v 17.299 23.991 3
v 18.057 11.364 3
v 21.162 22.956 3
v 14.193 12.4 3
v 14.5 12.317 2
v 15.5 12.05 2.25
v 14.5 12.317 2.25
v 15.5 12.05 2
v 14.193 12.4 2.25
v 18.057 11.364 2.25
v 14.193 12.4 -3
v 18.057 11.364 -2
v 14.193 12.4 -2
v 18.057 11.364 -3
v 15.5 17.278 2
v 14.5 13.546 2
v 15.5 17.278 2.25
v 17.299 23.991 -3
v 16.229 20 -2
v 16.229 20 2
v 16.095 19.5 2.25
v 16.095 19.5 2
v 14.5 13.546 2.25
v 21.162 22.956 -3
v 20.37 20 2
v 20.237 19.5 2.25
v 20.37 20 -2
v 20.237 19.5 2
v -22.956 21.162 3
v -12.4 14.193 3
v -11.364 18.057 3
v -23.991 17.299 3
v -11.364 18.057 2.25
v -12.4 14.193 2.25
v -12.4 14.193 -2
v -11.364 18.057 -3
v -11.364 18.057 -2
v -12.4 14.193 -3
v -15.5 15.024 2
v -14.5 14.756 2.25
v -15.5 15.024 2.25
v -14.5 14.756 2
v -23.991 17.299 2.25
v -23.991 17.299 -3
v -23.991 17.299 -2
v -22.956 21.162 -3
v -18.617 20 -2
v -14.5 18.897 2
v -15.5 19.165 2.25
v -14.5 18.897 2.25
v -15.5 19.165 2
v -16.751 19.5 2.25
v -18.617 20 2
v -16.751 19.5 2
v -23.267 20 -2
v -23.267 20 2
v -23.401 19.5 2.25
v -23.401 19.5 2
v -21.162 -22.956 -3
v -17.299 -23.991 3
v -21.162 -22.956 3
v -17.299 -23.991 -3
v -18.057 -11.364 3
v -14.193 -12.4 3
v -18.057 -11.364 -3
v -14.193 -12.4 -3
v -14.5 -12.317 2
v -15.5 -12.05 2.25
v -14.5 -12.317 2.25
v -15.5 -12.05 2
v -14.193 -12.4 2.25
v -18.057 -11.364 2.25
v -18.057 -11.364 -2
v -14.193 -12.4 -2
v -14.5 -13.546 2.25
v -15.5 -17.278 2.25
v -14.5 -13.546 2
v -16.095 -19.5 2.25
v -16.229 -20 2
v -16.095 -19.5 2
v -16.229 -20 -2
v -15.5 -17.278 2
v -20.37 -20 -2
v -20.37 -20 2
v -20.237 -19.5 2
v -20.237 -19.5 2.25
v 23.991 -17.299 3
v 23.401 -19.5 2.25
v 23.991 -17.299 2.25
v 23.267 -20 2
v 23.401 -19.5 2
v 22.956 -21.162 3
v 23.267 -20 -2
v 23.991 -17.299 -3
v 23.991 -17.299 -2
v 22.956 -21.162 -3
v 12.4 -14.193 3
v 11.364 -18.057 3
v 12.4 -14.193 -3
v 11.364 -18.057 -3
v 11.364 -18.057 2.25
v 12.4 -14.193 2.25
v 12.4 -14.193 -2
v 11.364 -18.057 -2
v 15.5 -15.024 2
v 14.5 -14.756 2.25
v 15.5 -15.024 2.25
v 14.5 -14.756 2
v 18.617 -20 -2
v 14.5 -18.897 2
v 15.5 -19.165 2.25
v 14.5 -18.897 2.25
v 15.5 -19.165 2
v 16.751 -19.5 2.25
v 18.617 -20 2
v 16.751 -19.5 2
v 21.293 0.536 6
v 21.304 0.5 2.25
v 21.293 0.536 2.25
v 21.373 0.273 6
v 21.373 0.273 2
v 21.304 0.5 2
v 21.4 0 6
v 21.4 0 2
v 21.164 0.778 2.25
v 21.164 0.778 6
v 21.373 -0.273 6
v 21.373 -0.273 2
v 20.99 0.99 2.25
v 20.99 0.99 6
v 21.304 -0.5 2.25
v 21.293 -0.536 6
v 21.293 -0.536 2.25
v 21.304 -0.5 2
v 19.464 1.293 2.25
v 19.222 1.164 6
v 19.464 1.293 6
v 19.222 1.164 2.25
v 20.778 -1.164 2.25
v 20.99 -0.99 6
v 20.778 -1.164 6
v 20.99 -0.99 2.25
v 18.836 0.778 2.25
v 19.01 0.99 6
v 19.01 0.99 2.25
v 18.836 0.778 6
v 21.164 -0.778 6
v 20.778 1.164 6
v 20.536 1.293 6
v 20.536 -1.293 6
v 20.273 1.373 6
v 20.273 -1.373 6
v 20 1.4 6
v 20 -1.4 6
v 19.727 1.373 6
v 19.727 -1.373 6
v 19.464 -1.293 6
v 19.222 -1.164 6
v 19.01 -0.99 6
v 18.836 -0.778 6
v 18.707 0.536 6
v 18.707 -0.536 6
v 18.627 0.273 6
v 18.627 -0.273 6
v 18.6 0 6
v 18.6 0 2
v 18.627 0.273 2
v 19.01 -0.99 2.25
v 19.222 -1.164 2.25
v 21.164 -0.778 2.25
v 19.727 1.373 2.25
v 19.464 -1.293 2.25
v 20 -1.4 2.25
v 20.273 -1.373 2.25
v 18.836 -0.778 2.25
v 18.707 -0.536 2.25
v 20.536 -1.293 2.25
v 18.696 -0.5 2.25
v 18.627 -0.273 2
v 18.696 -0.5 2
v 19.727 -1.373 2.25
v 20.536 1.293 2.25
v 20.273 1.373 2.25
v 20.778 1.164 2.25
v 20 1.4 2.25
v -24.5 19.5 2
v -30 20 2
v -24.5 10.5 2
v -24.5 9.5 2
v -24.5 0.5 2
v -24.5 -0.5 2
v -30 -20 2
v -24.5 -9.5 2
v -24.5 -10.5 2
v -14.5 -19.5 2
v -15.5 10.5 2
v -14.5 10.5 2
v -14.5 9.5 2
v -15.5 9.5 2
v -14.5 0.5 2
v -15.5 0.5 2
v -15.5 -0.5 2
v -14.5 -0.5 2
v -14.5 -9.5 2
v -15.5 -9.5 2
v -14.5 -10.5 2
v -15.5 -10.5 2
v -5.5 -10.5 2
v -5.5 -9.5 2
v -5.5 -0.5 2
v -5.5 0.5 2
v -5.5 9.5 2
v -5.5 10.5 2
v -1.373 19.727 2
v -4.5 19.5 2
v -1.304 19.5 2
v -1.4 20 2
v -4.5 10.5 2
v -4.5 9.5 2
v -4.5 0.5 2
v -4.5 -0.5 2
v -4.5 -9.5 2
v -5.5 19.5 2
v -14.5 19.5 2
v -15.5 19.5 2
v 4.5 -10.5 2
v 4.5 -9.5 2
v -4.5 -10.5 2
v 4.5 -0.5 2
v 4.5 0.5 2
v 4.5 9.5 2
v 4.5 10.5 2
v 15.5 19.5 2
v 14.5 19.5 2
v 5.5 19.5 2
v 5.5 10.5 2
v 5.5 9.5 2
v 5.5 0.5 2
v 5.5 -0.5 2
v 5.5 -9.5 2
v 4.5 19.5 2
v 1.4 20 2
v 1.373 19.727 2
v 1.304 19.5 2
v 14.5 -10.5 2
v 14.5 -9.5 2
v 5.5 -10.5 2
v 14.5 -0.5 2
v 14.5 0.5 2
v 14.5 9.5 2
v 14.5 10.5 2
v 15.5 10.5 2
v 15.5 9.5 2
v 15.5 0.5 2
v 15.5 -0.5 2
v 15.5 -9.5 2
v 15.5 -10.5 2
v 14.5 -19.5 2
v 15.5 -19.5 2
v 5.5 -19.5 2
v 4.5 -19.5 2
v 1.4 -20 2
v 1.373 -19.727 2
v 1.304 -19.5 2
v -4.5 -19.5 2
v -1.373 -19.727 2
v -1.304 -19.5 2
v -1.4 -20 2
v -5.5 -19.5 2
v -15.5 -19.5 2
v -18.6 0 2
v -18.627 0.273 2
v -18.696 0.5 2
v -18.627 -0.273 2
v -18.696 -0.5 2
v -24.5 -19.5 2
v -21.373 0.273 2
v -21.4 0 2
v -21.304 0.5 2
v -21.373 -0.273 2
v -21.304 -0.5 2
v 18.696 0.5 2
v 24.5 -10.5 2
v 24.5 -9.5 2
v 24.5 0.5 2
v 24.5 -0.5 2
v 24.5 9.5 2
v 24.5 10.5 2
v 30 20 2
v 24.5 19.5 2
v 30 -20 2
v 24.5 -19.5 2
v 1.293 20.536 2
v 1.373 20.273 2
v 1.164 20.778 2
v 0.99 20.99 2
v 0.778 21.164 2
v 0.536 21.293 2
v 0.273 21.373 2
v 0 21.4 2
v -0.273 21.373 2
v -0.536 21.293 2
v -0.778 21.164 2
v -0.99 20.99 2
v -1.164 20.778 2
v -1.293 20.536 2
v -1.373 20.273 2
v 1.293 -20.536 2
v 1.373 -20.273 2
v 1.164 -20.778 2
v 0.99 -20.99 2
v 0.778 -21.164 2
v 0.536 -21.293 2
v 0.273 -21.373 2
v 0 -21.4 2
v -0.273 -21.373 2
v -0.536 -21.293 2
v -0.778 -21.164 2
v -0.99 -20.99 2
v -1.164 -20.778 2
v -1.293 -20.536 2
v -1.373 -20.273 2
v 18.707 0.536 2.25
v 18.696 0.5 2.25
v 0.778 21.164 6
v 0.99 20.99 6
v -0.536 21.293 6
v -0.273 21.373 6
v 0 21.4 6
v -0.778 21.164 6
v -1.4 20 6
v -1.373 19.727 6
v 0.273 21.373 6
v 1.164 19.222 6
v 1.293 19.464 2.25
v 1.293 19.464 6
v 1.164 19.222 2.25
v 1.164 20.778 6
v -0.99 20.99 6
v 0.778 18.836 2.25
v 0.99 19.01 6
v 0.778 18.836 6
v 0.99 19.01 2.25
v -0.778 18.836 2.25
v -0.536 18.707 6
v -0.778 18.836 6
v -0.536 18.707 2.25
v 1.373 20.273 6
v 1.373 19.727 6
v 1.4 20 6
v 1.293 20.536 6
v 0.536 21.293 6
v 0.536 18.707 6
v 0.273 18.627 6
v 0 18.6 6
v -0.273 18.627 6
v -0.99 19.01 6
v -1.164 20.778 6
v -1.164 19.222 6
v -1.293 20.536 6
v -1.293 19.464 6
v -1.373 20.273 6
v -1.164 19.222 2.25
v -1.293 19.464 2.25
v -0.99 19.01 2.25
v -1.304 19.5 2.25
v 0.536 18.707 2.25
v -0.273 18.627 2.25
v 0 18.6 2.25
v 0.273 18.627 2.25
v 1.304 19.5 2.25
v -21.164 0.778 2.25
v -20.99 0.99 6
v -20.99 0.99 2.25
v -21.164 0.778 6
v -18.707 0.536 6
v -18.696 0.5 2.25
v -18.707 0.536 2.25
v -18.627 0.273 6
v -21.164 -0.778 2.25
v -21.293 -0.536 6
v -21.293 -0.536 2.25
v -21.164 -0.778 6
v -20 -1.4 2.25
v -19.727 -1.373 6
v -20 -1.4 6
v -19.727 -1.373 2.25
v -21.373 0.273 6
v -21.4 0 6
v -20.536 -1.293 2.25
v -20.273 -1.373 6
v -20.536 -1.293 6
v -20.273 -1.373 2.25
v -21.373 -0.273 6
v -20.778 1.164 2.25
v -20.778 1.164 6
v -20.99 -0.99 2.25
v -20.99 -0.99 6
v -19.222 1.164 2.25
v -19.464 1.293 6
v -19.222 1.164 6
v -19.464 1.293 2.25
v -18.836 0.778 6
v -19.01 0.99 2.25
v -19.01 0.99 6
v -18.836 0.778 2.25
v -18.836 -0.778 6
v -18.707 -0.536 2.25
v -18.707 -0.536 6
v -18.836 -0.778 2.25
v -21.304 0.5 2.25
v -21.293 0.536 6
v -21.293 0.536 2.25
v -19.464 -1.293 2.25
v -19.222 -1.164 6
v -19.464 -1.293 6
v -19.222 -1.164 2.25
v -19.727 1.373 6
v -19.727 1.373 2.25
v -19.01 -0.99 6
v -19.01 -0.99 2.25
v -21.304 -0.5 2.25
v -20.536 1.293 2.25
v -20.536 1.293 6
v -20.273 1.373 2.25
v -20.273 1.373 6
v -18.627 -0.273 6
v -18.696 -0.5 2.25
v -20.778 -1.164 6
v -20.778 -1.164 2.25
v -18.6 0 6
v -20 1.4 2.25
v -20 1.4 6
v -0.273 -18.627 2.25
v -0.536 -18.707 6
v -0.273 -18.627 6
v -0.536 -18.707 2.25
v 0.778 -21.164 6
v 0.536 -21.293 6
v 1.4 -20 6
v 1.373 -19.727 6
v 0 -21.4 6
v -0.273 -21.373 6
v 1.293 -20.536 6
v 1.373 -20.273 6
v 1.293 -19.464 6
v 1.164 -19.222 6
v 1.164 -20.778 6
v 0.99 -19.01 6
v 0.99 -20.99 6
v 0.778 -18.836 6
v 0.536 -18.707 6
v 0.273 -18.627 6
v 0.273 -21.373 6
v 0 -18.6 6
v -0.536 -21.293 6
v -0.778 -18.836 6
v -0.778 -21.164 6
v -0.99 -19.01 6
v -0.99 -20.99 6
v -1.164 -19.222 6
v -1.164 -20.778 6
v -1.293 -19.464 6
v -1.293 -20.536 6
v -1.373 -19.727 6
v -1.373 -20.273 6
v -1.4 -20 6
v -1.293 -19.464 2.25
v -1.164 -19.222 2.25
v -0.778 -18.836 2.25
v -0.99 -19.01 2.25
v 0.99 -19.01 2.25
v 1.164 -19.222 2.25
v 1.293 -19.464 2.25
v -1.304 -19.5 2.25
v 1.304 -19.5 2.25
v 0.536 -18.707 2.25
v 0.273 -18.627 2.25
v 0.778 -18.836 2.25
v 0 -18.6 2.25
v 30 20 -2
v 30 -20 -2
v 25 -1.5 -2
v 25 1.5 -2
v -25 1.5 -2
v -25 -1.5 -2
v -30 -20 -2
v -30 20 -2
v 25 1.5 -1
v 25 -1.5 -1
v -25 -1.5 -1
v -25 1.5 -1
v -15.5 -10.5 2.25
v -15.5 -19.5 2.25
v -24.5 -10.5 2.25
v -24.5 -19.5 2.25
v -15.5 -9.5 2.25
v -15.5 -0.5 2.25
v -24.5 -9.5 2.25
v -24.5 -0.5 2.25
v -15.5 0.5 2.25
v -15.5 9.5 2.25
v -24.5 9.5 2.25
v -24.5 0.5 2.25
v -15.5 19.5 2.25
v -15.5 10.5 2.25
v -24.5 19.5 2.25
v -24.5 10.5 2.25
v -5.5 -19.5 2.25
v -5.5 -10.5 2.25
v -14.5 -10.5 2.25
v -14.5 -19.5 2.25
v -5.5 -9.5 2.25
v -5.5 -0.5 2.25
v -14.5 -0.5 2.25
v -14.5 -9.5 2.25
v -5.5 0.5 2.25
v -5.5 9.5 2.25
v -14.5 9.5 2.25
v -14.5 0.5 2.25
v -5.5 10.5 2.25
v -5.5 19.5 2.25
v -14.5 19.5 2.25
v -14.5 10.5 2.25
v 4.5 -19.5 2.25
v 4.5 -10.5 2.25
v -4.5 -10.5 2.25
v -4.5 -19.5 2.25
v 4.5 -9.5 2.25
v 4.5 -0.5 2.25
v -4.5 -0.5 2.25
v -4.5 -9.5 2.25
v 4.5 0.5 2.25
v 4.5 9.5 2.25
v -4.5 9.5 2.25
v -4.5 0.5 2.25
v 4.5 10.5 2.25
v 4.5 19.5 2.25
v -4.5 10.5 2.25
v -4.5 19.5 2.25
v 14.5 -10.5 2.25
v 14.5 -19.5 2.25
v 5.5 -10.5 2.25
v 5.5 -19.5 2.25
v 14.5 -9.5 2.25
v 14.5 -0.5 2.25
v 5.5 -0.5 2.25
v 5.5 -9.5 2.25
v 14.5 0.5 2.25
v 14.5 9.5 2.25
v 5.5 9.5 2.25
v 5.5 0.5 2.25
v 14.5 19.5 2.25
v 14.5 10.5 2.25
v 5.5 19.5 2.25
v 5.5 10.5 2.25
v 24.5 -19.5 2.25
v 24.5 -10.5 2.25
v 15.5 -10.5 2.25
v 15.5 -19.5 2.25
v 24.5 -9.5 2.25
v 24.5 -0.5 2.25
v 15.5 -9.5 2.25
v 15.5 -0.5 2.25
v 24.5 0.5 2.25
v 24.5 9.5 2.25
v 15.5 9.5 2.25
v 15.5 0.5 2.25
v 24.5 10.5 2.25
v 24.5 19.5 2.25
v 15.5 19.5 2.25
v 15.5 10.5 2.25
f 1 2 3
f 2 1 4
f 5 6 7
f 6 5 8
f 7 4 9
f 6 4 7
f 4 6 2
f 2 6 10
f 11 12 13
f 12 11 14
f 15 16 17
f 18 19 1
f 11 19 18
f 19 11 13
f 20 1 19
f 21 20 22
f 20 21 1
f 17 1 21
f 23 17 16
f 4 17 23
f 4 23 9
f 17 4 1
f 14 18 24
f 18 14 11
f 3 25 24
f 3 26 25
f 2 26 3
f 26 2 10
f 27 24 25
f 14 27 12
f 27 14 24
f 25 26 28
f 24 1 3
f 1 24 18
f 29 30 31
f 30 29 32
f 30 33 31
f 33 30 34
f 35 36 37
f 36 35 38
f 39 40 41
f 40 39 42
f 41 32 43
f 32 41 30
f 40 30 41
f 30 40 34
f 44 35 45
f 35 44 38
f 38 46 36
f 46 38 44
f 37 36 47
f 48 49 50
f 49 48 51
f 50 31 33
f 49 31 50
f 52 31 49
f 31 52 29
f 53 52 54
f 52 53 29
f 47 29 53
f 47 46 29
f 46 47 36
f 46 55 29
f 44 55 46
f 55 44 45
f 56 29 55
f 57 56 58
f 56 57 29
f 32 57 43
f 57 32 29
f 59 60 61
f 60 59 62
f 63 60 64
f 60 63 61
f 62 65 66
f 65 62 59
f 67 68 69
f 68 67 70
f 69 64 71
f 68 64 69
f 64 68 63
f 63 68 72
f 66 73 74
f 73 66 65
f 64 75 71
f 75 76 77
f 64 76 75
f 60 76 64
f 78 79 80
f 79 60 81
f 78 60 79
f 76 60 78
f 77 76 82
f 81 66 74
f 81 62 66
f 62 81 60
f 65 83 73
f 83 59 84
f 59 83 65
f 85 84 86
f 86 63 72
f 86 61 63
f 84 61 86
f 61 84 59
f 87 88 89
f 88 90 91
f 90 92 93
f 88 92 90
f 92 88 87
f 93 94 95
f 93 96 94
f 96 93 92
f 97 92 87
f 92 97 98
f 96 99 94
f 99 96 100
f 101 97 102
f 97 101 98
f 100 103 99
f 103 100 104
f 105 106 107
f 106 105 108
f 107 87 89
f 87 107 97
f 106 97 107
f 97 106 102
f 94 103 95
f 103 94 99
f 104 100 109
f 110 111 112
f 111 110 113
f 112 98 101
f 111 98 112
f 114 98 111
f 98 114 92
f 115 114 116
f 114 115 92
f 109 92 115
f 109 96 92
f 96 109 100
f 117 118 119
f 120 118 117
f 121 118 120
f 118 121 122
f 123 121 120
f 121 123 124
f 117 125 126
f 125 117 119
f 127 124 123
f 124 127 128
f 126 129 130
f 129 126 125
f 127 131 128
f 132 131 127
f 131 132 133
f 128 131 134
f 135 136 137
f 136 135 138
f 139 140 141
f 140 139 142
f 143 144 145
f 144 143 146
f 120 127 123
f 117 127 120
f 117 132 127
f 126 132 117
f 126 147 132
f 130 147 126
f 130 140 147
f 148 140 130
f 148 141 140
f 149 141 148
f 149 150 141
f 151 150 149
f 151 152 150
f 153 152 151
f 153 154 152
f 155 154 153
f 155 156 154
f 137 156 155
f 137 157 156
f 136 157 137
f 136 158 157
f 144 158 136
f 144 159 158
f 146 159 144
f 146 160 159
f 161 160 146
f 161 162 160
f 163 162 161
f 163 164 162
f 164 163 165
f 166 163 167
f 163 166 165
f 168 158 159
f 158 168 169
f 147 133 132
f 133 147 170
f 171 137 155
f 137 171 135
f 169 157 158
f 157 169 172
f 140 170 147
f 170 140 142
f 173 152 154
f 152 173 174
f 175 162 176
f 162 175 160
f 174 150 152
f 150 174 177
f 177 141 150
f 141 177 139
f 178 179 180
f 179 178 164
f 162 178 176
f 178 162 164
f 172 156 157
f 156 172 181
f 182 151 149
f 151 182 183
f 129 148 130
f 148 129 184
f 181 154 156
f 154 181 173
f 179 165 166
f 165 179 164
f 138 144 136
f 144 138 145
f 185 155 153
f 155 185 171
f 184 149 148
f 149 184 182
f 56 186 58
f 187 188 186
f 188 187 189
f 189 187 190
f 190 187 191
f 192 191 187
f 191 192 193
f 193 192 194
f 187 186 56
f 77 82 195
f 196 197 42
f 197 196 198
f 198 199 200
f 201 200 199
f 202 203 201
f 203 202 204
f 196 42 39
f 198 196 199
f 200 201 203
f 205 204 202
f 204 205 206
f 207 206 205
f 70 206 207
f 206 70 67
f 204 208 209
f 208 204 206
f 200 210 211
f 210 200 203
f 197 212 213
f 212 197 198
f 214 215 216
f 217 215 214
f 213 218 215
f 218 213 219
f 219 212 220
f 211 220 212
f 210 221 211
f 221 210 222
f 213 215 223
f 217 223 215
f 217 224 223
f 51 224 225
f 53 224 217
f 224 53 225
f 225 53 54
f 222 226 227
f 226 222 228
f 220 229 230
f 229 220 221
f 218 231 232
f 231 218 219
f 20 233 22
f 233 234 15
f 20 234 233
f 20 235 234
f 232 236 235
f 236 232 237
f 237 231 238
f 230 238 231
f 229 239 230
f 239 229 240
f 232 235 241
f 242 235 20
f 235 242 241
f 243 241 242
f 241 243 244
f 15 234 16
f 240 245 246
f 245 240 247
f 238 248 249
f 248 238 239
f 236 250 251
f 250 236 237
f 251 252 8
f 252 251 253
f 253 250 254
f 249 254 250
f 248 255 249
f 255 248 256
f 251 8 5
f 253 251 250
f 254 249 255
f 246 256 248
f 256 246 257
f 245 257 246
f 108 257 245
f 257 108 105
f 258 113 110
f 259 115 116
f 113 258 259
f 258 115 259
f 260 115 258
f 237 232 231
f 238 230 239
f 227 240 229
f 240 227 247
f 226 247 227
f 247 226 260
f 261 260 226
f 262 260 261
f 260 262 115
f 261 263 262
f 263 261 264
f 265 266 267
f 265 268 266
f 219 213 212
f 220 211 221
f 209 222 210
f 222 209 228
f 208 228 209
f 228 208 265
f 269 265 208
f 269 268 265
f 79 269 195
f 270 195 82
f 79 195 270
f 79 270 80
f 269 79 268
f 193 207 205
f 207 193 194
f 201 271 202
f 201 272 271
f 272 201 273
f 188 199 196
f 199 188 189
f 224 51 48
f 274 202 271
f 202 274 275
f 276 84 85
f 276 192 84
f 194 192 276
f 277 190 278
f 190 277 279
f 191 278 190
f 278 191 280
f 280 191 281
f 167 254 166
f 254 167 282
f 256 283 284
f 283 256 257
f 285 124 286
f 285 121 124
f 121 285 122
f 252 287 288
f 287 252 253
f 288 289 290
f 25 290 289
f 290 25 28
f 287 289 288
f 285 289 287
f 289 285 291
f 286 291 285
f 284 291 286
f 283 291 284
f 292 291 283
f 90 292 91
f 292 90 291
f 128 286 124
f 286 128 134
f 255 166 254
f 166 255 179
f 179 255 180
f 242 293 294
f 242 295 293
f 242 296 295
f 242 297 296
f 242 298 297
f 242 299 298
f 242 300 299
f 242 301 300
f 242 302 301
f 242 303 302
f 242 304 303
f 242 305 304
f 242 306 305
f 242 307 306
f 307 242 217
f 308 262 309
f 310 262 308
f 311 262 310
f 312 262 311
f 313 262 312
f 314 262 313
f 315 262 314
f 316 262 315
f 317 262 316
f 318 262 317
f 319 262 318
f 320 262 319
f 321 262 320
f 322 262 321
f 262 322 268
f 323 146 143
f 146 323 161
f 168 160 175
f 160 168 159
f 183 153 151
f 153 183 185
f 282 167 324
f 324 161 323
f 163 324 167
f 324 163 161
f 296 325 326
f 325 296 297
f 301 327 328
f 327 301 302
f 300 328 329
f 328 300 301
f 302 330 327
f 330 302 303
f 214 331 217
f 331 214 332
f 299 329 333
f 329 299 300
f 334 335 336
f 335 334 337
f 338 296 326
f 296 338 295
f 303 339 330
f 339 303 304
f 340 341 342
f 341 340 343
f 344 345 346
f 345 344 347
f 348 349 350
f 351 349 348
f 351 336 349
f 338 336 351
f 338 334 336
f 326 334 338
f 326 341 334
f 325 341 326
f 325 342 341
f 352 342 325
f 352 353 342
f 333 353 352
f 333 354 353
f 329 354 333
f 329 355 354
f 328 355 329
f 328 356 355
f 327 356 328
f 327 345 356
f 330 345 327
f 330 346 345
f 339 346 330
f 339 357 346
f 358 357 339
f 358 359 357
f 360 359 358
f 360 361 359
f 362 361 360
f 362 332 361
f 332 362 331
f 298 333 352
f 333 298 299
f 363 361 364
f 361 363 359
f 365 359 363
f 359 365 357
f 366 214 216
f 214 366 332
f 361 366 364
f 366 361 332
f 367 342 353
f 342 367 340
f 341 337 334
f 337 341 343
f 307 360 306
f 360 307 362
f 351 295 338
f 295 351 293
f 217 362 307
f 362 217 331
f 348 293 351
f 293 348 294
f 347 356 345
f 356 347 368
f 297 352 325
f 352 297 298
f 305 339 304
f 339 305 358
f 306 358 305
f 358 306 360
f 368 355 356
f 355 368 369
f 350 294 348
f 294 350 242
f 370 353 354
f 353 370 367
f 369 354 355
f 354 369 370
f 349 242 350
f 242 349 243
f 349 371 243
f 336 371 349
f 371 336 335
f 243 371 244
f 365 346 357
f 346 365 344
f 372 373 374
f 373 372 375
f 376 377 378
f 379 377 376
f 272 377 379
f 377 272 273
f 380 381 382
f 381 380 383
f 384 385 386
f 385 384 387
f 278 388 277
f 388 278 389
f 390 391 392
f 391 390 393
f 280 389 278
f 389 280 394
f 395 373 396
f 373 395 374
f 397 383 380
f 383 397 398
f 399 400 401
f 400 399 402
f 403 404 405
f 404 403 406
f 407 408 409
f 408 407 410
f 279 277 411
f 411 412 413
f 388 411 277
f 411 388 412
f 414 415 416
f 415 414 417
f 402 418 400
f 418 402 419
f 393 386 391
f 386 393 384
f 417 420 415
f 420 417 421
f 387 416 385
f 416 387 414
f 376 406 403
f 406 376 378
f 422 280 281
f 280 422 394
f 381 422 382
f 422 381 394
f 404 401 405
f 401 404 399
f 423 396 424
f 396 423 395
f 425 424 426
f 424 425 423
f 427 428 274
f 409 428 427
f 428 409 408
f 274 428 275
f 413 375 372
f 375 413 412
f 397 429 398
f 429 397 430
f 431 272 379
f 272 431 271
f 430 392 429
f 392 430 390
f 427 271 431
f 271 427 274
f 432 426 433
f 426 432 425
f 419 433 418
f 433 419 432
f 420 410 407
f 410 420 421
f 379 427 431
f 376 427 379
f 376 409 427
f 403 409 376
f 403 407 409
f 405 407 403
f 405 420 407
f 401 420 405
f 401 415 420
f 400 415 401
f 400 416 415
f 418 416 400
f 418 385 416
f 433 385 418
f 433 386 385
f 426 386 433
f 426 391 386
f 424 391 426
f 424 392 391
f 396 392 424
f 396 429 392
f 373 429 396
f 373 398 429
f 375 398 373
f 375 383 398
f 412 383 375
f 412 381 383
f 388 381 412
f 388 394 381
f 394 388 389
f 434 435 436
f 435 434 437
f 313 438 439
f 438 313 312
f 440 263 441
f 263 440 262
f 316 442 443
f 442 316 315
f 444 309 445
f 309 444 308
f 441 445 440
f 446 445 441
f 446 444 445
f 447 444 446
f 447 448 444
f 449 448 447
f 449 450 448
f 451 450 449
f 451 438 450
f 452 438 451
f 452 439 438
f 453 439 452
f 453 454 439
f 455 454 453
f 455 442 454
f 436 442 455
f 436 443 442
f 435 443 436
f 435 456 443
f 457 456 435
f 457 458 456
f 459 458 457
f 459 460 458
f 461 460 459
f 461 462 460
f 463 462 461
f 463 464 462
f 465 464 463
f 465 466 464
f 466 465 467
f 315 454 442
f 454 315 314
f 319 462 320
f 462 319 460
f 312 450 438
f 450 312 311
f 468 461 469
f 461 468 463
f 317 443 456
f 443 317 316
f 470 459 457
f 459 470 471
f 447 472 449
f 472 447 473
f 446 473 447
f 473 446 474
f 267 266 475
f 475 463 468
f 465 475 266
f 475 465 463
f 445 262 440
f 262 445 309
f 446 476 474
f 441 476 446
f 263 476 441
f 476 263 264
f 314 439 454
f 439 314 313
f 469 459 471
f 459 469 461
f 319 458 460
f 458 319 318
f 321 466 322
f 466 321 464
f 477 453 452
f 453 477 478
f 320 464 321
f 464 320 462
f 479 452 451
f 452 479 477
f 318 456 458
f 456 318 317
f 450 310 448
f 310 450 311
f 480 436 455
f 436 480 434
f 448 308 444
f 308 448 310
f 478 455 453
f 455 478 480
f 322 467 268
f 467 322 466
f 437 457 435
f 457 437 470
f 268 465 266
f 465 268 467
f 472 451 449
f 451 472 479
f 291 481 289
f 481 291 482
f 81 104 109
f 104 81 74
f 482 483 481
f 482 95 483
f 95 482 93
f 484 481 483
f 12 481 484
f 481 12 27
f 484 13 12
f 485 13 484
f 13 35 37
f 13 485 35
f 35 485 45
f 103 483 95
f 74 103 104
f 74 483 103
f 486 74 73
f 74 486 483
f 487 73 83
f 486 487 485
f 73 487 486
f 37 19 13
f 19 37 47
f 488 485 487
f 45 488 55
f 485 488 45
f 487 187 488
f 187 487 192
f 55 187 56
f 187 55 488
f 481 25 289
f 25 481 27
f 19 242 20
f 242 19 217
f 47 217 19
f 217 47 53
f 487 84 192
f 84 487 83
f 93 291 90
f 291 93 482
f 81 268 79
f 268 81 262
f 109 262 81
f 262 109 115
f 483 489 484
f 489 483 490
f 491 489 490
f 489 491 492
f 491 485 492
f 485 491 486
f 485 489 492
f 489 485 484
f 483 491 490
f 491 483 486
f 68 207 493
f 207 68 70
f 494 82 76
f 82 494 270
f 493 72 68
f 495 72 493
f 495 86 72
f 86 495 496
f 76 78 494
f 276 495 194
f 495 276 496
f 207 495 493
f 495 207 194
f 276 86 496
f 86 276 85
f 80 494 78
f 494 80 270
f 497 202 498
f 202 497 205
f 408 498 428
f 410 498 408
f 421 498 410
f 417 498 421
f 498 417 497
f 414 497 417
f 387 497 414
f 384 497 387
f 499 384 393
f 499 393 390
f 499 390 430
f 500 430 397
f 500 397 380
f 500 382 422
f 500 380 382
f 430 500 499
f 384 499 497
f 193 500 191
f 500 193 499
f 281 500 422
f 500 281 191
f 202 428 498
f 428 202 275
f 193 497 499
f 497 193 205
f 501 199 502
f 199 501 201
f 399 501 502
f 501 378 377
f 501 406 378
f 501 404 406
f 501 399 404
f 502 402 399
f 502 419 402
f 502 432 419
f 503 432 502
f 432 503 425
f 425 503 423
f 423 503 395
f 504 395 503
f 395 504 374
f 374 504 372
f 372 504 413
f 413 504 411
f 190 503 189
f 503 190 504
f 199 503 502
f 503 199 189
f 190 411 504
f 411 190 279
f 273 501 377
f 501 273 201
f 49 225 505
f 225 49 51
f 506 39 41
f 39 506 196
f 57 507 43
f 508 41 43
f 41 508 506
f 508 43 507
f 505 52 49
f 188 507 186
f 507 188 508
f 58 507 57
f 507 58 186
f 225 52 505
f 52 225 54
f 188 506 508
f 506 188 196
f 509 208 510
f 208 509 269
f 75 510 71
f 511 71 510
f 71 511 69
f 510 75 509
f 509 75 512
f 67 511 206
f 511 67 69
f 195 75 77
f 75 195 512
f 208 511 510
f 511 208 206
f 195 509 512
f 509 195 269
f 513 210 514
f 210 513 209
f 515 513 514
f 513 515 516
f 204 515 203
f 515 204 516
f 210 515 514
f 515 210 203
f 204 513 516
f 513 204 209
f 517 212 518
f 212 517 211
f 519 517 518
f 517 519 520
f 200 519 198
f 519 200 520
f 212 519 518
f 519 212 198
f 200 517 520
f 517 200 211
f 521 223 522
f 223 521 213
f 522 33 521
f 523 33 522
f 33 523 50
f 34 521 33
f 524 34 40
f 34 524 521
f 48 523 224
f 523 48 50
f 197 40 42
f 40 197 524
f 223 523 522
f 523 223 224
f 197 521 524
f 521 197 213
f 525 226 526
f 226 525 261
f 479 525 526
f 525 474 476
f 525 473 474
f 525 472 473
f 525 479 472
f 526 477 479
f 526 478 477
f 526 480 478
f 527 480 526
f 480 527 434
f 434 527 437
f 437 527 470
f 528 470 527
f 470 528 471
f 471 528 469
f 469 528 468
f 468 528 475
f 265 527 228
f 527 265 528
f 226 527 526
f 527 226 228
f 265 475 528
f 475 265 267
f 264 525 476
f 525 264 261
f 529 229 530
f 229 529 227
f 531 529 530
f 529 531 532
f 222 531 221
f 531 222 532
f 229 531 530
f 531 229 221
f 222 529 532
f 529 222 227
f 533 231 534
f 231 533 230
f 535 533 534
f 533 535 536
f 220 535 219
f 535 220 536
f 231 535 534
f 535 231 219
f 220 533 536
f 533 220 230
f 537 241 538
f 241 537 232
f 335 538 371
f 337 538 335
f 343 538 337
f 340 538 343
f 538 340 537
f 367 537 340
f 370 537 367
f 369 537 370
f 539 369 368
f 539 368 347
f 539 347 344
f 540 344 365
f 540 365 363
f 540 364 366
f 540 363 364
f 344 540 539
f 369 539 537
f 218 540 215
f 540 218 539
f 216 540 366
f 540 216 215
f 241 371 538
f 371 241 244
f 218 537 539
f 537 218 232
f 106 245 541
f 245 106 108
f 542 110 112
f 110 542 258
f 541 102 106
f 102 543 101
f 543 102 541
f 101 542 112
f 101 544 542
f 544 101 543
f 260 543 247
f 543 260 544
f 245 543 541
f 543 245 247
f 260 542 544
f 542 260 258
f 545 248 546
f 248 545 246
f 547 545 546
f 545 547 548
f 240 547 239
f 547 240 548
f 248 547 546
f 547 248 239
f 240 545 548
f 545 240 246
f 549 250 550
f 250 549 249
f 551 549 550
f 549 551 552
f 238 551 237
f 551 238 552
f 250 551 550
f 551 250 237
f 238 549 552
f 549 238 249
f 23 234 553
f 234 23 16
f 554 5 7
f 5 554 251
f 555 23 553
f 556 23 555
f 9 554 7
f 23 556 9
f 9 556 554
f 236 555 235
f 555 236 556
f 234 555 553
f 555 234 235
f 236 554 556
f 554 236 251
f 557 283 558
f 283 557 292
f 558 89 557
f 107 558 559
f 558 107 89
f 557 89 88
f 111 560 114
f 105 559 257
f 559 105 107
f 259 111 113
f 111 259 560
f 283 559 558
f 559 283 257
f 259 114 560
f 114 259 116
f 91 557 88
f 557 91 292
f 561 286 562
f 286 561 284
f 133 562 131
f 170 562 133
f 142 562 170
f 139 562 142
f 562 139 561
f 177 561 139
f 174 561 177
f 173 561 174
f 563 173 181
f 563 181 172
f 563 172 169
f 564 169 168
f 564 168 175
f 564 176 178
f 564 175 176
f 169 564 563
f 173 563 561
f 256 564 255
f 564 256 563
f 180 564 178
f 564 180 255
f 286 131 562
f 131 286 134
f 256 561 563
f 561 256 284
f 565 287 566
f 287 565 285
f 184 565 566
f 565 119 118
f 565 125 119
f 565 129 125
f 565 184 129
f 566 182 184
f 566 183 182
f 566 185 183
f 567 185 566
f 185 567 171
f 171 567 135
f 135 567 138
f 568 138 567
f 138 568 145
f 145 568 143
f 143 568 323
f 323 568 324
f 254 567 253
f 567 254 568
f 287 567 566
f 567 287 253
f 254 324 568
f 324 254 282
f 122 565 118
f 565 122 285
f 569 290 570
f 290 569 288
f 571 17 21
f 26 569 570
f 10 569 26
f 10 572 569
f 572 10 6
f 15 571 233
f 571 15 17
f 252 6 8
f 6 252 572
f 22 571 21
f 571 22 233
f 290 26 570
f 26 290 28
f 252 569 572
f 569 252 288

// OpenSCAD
// COBRA-Snap Solar Panel Module
// Bayonet twist-lock mounting

$fn = 32;

module solar_panel() {
    difference() {
        union() {
            // Panel body
            cube([60, 40, 4], center=true);
            
            // Bayonet lugs (4x)
            for(angle = [45, 135, 225, 315]) {
                rotate([0, 0, angle])
                translate([25, 0, 0])
                rotate([0, 0, 30])  // L-shape
                cube([12, 4, 6], center=true);
            }
            
            // Alignment pins (4x)
            for(angle = [0, 90, 180, 270]) {
                rotate([0, 0, angle])
                translate([20, 0, 4])
                cylinder(h=4, d=2.8, center=true);
            }
        }
        
        // Wire exit channel
        translate([0, 0, -2])
        cube([50, 3, 2], center=true);
    }
    
    // Solar cells (simplified)
    for(x = [-20:10:20]) {
        for(y = [-15:10:15]) {
            translate([x, y, 2])
            cube([9, 9, 0.5], center=true);
        }
    }
}

solar_panel();
